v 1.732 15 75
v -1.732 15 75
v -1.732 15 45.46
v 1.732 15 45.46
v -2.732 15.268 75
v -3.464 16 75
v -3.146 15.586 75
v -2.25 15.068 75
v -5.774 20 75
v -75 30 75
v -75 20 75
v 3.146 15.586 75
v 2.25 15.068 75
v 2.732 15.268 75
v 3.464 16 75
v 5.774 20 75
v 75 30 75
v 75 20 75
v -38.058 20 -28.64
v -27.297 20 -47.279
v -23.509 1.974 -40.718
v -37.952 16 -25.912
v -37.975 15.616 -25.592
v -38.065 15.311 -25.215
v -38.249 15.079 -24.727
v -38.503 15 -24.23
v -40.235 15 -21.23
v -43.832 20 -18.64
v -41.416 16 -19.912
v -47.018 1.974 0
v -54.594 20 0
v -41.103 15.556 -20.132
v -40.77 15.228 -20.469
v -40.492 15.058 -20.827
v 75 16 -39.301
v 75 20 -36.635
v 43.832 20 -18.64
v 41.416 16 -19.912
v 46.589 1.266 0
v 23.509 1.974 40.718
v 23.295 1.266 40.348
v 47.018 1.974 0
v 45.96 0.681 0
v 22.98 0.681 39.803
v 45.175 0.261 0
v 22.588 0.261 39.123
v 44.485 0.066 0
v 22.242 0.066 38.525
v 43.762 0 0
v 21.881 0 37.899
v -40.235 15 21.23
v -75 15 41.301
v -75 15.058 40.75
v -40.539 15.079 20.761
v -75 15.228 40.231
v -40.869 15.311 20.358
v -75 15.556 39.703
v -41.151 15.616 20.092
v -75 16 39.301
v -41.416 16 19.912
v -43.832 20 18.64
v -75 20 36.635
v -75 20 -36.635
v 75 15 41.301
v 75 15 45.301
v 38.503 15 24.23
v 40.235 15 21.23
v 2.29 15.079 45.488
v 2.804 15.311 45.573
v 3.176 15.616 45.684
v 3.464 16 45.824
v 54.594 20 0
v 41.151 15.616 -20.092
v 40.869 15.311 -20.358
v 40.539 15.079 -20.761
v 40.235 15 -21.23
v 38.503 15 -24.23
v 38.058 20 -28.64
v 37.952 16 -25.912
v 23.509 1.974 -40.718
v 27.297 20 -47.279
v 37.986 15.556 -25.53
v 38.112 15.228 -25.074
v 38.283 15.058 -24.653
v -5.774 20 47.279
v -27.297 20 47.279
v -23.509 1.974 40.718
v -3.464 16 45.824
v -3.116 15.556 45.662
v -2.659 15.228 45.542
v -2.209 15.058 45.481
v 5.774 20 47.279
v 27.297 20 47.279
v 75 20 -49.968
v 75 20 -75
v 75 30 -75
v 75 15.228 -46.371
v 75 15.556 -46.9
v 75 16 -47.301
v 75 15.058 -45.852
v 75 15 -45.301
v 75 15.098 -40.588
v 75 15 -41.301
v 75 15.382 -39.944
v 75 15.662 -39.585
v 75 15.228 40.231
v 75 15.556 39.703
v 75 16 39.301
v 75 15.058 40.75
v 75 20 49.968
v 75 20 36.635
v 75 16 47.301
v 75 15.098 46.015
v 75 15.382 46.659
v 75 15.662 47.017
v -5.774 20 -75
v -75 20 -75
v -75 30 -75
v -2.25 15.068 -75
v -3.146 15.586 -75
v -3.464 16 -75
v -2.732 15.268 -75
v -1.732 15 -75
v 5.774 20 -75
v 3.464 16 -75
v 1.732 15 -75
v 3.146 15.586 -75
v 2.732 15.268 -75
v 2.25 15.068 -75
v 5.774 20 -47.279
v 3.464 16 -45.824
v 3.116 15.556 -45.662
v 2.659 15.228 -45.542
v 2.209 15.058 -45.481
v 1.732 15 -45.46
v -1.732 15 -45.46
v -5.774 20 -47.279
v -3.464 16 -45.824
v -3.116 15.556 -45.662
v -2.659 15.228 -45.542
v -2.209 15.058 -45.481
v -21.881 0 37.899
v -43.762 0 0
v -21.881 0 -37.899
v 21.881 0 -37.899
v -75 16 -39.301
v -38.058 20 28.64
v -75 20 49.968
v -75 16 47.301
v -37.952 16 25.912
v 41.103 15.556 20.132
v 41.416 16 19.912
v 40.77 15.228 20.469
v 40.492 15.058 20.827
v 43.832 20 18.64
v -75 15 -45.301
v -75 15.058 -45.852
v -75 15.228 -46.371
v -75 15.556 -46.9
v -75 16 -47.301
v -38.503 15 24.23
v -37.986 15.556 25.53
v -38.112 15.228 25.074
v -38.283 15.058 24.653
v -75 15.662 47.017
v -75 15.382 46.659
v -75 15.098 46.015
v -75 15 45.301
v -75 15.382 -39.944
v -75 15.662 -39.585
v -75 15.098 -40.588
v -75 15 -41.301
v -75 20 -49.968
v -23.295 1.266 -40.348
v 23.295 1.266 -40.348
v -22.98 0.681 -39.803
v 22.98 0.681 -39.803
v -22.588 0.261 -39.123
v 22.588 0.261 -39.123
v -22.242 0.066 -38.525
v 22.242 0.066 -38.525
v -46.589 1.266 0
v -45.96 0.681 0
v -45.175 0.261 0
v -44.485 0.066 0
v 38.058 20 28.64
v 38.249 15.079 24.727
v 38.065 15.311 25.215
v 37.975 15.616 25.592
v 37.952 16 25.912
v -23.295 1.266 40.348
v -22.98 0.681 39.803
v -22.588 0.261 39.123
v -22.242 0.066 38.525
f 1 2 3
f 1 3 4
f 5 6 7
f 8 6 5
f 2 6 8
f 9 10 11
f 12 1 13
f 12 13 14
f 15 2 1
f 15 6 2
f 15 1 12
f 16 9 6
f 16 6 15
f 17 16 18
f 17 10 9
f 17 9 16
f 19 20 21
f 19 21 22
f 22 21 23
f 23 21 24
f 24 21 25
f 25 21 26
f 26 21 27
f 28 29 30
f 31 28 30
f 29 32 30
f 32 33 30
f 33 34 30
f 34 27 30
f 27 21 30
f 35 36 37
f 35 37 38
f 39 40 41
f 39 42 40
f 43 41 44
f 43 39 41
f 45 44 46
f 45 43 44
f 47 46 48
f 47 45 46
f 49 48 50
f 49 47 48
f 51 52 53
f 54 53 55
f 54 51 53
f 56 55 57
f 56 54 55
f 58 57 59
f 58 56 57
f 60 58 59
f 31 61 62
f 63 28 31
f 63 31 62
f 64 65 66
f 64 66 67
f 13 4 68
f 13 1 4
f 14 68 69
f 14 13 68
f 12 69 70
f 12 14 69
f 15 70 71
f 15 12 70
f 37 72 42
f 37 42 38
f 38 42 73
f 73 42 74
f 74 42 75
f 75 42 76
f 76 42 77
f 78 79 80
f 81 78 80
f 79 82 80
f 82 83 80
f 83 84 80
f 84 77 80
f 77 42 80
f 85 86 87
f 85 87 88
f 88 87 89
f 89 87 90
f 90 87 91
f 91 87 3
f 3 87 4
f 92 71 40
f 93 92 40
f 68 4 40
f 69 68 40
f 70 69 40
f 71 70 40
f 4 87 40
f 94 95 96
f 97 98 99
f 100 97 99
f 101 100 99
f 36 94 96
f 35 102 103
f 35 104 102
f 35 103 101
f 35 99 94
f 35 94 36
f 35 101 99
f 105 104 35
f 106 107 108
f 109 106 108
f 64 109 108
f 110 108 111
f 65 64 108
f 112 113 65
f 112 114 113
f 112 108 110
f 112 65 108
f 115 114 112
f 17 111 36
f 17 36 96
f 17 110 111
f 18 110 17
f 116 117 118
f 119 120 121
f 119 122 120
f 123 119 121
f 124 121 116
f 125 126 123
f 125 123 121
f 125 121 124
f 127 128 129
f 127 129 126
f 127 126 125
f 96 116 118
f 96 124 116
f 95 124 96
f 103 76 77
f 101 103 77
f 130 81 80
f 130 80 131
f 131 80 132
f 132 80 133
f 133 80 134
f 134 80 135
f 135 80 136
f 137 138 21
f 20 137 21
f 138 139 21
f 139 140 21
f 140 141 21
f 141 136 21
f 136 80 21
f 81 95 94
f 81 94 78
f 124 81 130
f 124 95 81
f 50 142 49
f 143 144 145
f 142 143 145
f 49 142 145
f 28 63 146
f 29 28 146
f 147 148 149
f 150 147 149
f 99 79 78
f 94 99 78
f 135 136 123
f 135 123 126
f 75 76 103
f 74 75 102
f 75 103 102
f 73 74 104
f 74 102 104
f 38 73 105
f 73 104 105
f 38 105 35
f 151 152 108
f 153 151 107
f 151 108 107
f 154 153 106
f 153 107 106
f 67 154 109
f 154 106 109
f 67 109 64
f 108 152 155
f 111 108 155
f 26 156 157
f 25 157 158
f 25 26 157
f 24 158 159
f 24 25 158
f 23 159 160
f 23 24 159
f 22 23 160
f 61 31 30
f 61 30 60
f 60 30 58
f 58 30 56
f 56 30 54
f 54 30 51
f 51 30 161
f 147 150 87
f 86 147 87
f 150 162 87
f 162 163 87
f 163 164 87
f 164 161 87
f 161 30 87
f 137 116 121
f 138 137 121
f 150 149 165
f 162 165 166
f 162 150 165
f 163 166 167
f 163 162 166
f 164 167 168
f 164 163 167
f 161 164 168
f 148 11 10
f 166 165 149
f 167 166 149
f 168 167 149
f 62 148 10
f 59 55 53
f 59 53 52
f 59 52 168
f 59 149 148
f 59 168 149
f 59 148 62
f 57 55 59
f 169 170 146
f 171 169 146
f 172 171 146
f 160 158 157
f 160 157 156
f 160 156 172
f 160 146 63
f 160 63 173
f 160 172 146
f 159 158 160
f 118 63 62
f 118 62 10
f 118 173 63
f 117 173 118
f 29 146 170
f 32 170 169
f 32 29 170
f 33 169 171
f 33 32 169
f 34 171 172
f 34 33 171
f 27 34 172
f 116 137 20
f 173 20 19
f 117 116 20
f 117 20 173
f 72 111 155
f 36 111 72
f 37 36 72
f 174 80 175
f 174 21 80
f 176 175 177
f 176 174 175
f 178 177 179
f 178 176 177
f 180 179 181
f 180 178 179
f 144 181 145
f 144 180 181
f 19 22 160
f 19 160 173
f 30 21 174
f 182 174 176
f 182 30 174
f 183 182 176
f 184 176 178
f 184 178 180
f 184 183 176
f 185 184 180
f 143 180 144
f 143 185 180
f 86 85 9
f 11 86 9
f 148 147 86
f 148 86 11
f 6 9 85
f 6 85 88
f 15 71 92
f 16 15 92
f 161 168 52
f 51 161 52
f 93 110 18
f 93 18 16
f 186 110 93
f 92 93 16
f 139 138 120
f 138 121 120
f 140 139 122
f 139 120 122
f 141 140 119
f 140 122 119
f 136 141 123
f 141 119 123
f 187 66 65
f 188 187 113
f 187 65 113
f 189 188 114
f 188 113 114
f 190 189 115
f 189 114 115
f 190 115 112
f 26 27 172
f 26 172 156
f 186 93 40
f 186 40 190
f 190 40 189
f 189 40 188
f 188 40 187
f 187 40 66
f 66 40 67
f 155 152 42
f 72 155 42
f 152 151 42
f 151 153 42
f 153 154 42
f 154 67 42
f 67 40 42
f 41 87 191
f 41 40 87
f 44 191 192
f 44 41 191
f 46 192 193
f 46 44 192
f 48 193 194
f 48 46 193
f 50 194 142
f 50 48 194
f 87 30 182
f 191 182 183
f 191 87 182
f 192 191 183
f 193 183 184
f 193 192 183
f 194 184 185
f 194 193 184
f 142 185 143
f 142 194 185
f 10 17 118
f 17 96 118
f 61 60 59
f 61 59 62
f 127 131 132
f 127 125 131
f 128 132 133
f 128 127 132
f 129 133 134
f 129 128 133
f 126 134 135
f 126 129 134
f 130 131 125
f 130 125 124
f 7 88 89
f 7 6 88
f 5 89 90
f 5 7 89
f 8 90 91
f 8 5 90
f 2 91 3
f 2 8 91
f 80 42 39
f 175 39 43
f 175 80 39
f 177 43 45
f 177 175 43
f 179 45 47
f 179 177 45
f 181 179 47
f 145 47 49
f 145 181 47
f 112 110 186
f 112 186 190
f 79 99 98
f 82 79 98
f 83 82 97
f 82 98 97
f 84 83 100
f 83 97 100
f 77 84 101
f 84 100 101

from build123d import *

# Parameters (mm, degrees)
HEXAGON_DEPTH = 20
HEXAGON_DRAFT = -20.000000000000043
BASE_DEPTH    = 10
SMALL_DEPTH   = 75
FILLET_2_R    = 3
ARRAY_START   = -102.451905284
ARRAY_DEPTH   = 204.903810568
ARRAY_2_DEPTH = 204.903810568
ARRAY_START_2 = 45.459553514
ARRAY_3_DEPTH = 29.540446486
FILLET2_R     = 2
CROQUIS4_W    = 26.916537621276092
CROQUIS4_H    = 24.058782859612524
CROQUIS4_W_2  = 36.99619518821565
CROQUIS4_H_2  = 32.17850701075816
TRIM_DEPTH    = 179.30560151606045


# Read off the part's stored shape, not the designer's step: array
with BuildPart() as part:
    # Croquis1 → hexagon (with draft: the straight prism first)
    with BuildSketch(Plane(origin=(0, 0, 0), x_dir=(1, 0, 0), z_dir=(0, 1, 0))):
        Polygon((46.18802153516988, 0), (23.09401076758485, 39.9999999999999), (-23.09401076758513, 39.99999999999974), (-46.18802153516988, -3.2253e-13), (-23.09401076758457, -40.00000000000006), (23.09401076758541, -39.99999999999958), align=None)
    extrude(amount=HEXAGON_DEPTH)
    # hexagon: the draft: its side faces are tilted about the plane it starts from
    hexagon_sides = [part.faces().sort_by_distance(p)[0] for p in [
        (34.641016151, 10, -20),
        (0, 10, -40),
        (-34.641016151, 10, -20),
        (-34.641016151, 10, 20),
        (0, 10, 40),
        (34.641016151, 10, 20),
    ]]
    draft(hexagon_sides, Plane(origin=(0, 0, 0), x_dir=(1, 0, 0), z_dir=(0, 1, 0)), HEXAGON_DRAFT)

    # Croquis2 → base (add)
    with BuildSketch(Plane(origin=(0, 20, 0), x_dir=(1, 0, 0), z_dir=(0, 1, 0))):
        Polygon((74.99999999999999, -74.99999999999999), (-75.00000000000001, -75.00000000000001), (-75.00000000000001, 74.99999999999999), (74.99999999999999, 75.00000000000001), align=None)
    extrude(amount=BASE_DEPTH)

    # Croquis3 → small (add, through all)
    with BuildSketch(Plane.XY):
        Polygon((-5.773502691896257, 20), (-2.886751345948127, 15), (2.886751345948127, 15), (5.7735026918962555, 20), (2.8867513459481215, 25.000000000000007), (-2.8867513459481278, 25.000000000000007), align=None)
    extrude(amount=-SMALL_DEPTH)

    # fillet 2
    fillet_2_edges = [part.edges().sort_by_distance(p)[0] for p in [
        (4.2277e-13, 0, 39.99999999999982),
        (-34.64101615137723, 0, 20.000000000000206),
        (-34.641016151377514, 0, -19.9999999999997),
        (-1.4921e-13, 0, -39.999999999999815),
        (34.641016151377364, 0, -19.999999999999957),
        (34.64101615137765, 0, 19.999999999999787),
    ]]
    fillet(fillet_2_edges, radius=FILLET_2_R)

    # array outline → array (add)
    with BuildSketch(Plane(origin=(0, 0, 0), x_dir=(0.500000000000004, 0, -0.8660254037844363), z_dir=(0.8660254037844363, 0, 0.5000000000000042)).offset(ARRAY_START)):
        Polygon((-5.773502692, 20), (-2.886751346, 15), (2.886751346, 15), (5.773502692, 20), (2.886751346, 25), (-2.886751346, 25), align=None)
    extrude(amount=ARRAY_DEPTH)

    # array 2 outline → array 2 (add)
    with BuildSketch(Plane(origin=(0, 0, 0), x_dir=(0.49999999999999767, 0, 0.86602540378444), z_dir=(0.8660254037844399, 0, -0.49999999999999795)).offset(ARRAY_START)):
        Polygon((5.773502692, -20), (2.886751346, -15), (-2.886751346, -15), (-5.773502692, -20), (-2.886751346, -25), (2.886751346, -25), align=None)
    extrude(amount=ARRAY_2_DEPTH)

    # array 3 outline → array 3 (add)
    with BuildSketch(Plane.XY.offset(ARRAY_START_2)):
        Polygon((-5.773502692, 20), (-2.886751346, 15), (2.886751346, 15), (5.773502692, 20), align=None)
    extrude(amount=ARRAY_3_DEPTH)

    # fillet2
    fillet2_edges = [part.edges().sort_by_distance(p)[0] for p in [
        (-2.886751346, 15, 60.229776756999996),
        (62.604164741938675, 15, -39.477864699543005),
        (65.49091608793843, 15, 34.47786469945364),
        (-62.60416474193839, 15, -39.477864699543446),
        (2.886751346, 15, 60.229776756999996),
        (-62.60416474193865, 15, 39.47786469954298),
        (-65.49091608793839, 15, -34.47786469945361),
        (2.886751345948127, 15, -60.22977675699644),
        (-2.886751345948127, 15, -60.22977675699643),
        (62.60416474193845, 15, 39.47786469954348),
        (65.49091608793866, 15, -34.47786469945315),
        (-65.49091608793867, 15, 34.47786469945314),
    ]]
    fillet(fillet2_edges, radius=FILLET2_R)

    # Croquis4 → trim (cut, through all)
    with BuildSketch(Plane(origin=(-1.388e-14, 0, -75), x_dir=(-1, 0, 1.9e-16), z_dir=(-1.9e-16, 0, -1))):
        with Locations((-88.45826881063805, 17.97060857019374)):
            Rectangle(CROQUIS4_W, CROQUIS4_H)
        with Locations((93.49809759410783, 13.910746494620925)):
            Rectangle(CROQUIS4_W_2, CROQUIS4_H_2)
    extrude(amount=-TRIM_DEPTH, mode=Mode.SUBTRACT)


solid = part.part
